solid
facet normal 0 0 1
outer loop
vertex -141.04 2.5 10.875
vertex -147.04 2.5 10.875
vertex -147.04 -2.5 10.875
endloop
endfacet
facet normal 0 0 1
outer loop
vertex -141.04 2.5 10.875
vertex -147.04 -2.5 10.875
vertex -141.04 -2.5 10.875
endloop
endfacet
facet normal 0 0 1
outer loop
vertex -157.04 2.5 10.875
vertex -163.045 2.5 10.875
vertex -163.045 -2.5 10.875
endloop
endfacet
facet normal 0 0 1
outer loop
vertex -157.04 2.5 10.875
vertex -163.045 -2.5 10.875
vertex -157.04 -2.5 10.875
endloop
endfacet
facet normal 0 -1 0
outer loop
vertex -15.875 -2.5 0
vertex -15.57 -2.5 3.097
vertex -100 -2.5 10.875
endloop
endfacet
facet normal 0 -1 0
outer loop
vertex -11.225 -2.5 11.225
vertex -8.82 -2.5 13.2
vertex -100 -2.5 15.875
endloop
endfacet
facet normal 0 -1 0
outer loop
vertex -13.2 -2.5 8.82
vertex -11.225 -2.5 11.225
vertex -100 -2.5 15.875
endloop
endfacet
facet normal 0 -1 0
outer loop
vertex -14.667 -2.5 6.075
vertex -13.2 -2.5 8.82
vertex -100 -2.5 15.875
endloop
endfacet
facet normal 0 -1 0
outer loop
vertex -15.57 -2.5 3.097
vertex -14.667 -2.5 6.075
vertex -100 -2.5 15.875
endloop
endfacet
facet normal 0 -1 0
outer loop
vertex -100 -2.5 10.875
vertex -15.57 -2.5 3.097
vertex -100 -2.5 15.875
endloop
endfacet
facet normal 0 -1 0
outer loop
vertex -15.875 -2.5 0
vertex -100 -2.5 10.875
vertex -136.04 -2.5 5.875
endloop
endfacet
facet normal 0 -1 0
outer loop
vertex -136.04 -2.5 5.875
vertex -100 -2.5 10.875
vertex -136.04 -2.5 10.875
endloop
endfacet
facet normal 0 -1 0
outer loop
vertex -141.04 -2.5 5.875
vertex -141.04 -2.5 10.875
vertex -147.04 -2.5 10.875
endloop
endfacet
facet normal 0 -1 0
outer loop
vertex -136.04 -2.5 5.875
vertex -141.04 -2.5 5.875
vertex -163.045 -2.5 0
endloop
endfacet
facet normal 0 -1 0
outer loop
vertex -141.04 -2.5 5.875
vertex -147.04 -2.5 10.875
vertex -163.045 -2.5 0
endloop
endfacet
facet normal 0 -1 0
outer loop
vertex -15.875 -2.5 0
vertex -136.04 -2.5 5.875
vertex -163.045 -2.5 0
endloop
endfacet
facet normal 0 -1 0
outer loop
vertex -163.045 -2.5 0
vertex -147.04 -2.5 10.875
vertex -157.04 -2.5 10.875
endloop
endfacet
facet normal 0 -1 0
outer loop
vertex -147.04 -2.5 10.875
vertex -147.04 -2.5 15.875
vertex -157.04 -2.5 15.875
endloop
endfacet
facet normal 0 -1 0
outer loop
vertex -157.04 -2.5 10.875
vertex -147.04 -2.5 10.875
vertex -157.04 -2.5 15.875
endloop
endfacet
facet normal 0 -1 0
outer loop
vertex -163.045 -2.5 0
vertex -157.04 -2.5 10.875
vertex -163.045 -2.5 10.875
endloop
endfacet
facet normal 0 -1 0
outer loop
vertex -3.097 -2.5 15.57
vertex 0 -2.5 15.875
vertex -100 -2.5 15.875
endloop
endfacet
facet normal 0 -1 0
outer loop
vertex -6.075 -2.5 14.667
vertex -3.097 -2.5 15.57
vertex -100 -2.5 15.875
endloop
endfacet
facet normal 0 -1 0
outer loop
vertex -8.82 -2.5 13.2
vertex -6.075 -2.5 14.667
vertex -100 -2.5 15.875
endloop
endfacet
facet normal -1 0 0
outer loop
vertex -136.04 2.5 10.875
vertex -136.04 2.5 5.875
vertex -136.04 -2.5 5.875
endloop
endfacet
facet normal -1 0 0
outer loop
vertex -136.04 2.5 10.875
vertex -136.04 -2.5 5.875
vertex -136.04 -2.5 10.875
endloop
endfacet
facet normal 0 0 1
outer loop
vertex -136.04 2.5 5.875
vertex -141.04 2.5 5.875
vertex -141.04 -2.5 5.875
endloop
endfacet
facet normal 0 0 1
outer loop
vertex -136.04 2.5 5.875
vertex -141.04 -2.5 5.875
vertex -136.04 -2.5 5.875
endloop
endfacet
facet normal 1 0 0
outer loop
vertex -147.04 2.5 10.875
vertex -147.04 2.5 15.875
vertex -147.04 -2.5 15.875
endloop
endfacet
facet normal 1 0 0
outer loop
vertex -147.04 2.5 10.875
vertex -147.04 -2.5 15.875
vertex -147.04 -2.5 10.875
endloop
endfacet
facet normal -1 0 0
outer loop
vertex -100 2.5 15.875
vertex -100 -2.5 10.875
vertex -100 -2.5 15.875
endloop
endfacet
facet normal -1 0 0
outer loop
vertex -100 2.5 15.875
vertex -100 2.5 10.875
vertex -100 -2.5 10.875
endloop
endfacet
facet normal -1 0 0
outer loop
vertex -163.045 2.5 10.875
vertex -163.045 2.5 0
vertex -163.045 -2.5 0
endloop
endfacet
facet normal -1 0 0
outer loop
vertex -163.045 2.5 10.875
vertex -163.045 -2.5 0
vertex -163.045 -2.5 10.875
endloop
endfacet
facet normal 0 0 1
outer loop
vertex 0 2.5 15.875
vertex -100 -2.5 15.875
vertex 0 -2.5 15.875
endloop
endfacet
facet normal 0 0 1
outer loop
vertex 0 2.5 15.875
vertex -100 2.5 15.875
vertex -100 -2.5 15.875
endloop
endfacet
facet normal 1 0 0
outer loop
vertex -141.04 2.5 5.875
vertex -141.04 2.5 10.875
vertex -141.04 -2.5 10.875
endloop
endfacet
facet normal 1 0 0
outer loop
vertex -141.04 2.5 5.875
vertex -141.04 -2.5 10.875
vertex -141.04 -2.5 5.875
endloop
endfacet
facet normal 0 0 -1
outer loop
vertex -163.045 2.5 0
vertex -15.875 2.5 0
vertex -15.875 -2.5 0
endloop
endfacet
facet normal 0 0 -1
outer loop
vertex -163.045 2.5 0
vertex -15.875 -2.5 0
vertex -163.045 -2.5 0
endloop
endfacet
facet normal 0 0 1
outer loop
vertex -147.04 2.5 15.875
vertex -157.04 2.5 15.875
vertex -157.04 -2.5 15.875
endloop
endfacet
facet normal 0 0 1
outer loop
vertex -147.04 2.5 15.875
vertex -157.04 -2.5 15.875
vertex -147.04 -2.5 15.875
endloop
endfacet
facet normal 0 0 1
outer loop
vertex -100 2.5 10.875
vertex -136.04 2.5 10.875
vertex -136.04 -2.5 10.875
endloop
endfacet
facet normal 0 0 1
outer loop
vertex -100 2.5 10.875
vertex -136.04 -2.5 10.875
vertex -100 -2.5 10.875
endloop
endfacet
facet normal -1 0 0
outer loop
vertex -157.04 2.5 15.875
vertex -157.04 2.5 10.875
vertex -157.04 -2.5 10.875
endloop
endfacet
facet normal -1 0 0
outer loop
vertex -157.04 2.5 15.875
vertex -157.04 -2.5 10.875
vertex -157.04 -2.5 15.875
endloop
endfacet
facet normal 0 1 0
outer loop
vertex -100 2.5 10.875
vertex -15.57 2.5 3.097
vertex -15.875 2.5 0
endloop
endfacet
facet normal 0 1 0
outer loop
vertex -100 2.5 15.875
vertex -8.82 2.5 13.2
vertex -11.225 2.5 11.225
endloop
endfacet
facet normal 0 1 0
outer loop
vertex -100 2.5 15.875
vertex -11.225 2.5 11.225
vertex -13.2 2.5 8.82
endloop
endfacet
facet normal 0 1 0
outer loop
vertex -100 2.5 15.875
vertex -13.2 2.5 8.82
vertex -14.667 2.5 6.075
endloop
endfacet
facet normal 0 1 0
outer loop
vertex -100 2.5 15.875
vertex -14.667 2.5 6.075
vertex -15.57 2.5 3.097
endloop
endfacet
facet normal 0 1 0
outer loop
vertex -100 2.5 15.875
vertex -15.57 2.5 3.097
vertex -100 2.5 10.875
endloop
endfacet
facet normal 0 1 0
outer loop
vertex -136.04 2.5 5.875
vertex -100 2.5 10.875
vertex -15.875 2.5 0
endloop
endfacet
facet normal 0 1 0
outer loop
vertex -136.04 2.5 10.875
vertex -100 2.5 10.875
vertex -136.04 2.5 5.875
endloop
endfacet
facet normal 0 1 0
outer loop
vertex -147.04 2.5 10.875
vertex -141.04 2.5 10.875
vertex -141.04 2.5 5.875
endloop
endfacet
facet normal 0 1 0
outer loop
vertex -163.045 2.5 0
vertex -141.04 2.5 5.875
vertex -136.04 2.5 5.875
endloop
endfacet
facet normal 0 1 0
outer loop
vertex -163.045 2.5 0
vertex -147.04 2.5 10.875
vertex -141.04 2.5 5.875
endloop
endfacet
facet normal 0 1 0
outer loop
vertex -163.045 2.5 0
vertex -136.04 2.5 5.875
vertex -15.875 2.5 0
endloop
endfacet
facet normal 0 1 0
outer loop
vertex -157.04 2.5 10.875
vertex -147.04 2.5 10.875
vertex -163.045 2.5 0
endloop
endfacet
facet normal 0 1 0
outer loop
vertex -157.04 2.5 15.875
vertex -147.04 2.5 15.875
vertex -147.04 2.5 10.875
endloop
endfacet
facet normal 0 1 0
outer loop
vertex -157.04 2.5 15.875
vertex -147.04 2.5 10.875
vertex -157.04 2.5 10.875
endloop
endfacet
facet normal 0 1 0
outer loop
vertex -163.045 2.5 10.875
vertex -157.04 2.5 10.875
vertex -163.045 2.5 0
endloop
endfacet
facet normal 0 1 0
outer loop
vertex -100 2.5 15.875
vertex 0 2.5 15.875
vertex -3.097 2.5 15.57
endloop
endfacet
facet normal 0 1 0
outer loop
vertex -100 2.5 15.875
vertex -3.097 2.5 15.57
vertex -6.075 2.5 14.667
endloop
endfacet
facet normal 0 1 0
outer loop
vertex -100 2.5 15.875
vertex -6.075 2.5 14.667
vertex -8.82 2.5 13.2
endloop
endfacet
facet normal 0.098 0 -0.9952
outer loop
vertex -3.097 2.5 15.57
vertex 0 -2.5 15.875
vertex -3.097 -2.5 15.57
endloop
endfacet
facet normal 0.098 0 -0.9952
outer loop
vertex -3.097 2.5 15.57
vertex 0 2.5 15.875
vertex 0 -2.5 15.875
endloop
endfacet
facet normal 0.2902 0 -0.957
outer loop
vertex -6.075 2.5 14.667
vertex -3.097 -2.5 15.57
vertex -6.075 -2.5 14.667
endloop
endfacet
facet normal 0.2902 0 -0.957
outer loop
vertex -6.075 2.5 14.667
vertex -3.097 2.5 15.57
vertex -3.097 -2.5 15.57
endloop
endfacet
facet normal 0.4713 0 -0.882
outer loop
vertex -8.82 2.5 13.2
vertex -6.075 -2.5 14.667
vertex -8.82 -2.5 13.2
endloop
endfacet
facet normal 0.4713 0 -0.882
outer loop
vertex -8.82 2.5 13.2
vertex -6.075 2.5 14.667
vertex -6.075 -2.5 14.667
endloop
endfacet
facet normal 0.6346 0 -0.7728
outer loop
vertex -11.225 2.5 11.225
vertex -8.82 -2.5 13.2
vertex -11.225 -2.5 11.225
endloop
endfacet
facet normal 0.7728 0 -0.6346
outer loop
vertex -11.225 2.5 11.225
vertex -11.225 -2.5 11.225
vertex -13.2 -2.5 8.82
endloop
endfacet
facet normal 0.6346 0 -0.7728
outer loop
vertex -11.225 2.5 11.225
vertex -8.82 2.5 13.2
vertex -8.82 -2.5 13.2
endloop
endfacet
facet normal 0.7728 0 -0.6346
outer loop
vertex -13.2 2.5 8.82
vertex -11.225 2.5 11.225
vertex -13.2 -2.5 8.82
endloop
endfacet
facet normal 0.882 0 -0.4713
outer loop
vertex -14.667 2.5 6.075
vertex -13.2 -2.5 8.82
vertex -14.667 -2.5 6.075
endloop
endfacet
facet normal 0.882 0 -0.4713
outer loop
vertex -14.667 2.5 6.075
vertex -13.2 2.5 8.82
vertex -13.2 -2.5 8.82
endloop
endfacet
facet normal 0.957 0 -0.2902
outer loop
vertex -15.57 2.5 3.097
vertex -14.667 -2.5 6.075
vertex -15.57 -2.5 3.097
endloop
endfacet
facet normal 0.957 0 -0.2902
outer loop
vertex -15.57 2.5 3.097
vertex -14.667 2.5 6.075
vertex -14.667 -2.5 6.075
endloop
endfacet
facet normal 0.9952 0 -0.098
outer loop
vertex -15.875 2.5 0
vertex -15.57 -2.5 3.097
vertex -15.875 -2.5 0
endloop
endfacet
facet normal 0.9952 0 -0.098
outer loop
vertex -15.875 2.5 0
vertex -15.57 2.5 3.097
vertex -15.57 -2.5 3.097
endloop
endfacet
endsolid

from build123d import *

# Parameters (mm, degrees)
BOSS_EXTRUDE1_DEPTH = 2.5


with BuildPart() as part:
    # Sketch1 → Boss-Extrude1 (new, symmetric)
    with BuildSketch(Plane(origin=(0, 0, 0), x_dir=(-1, 0, 0), z_dir=(0, 1, 0))):
        with BuildLine():
            ThreePointArc((0, 15.875), (11.225320151, 11.225320151), (15.875, 0))
            Line((15.875, 0), (163.044989153, 0))
            Line((163.044989153, 0), (163.044989153, 10.875))
            Line((163.044989153, 10.875), (157.04, 10.875))
            Line((157.04, 10.875), (157.04, 15.875))
            Line((157.04, 15.875), (147.04, 15.875))
            Line((147.04, 15.875), (147.04, 10.875))
            Line((147.04, 10.875), (141.04, 10.875))
            Line((141.04, 10.875), (141.04, 5.875))
            Line((141.04, 5.875), (136.04, 5.875))
            Line((136.04, 5.875), (136.04, 10.875))
            Line((136.04, 10.875), (100, 10.875))
            Line((100, 10.875), (100, 15.875))
            Line((100, 15.875), (0, 15.875))
        make_face()
    extrude(amount=BOSS_EXTRUDE1_DEPTH, both=True)


solid = part.part
